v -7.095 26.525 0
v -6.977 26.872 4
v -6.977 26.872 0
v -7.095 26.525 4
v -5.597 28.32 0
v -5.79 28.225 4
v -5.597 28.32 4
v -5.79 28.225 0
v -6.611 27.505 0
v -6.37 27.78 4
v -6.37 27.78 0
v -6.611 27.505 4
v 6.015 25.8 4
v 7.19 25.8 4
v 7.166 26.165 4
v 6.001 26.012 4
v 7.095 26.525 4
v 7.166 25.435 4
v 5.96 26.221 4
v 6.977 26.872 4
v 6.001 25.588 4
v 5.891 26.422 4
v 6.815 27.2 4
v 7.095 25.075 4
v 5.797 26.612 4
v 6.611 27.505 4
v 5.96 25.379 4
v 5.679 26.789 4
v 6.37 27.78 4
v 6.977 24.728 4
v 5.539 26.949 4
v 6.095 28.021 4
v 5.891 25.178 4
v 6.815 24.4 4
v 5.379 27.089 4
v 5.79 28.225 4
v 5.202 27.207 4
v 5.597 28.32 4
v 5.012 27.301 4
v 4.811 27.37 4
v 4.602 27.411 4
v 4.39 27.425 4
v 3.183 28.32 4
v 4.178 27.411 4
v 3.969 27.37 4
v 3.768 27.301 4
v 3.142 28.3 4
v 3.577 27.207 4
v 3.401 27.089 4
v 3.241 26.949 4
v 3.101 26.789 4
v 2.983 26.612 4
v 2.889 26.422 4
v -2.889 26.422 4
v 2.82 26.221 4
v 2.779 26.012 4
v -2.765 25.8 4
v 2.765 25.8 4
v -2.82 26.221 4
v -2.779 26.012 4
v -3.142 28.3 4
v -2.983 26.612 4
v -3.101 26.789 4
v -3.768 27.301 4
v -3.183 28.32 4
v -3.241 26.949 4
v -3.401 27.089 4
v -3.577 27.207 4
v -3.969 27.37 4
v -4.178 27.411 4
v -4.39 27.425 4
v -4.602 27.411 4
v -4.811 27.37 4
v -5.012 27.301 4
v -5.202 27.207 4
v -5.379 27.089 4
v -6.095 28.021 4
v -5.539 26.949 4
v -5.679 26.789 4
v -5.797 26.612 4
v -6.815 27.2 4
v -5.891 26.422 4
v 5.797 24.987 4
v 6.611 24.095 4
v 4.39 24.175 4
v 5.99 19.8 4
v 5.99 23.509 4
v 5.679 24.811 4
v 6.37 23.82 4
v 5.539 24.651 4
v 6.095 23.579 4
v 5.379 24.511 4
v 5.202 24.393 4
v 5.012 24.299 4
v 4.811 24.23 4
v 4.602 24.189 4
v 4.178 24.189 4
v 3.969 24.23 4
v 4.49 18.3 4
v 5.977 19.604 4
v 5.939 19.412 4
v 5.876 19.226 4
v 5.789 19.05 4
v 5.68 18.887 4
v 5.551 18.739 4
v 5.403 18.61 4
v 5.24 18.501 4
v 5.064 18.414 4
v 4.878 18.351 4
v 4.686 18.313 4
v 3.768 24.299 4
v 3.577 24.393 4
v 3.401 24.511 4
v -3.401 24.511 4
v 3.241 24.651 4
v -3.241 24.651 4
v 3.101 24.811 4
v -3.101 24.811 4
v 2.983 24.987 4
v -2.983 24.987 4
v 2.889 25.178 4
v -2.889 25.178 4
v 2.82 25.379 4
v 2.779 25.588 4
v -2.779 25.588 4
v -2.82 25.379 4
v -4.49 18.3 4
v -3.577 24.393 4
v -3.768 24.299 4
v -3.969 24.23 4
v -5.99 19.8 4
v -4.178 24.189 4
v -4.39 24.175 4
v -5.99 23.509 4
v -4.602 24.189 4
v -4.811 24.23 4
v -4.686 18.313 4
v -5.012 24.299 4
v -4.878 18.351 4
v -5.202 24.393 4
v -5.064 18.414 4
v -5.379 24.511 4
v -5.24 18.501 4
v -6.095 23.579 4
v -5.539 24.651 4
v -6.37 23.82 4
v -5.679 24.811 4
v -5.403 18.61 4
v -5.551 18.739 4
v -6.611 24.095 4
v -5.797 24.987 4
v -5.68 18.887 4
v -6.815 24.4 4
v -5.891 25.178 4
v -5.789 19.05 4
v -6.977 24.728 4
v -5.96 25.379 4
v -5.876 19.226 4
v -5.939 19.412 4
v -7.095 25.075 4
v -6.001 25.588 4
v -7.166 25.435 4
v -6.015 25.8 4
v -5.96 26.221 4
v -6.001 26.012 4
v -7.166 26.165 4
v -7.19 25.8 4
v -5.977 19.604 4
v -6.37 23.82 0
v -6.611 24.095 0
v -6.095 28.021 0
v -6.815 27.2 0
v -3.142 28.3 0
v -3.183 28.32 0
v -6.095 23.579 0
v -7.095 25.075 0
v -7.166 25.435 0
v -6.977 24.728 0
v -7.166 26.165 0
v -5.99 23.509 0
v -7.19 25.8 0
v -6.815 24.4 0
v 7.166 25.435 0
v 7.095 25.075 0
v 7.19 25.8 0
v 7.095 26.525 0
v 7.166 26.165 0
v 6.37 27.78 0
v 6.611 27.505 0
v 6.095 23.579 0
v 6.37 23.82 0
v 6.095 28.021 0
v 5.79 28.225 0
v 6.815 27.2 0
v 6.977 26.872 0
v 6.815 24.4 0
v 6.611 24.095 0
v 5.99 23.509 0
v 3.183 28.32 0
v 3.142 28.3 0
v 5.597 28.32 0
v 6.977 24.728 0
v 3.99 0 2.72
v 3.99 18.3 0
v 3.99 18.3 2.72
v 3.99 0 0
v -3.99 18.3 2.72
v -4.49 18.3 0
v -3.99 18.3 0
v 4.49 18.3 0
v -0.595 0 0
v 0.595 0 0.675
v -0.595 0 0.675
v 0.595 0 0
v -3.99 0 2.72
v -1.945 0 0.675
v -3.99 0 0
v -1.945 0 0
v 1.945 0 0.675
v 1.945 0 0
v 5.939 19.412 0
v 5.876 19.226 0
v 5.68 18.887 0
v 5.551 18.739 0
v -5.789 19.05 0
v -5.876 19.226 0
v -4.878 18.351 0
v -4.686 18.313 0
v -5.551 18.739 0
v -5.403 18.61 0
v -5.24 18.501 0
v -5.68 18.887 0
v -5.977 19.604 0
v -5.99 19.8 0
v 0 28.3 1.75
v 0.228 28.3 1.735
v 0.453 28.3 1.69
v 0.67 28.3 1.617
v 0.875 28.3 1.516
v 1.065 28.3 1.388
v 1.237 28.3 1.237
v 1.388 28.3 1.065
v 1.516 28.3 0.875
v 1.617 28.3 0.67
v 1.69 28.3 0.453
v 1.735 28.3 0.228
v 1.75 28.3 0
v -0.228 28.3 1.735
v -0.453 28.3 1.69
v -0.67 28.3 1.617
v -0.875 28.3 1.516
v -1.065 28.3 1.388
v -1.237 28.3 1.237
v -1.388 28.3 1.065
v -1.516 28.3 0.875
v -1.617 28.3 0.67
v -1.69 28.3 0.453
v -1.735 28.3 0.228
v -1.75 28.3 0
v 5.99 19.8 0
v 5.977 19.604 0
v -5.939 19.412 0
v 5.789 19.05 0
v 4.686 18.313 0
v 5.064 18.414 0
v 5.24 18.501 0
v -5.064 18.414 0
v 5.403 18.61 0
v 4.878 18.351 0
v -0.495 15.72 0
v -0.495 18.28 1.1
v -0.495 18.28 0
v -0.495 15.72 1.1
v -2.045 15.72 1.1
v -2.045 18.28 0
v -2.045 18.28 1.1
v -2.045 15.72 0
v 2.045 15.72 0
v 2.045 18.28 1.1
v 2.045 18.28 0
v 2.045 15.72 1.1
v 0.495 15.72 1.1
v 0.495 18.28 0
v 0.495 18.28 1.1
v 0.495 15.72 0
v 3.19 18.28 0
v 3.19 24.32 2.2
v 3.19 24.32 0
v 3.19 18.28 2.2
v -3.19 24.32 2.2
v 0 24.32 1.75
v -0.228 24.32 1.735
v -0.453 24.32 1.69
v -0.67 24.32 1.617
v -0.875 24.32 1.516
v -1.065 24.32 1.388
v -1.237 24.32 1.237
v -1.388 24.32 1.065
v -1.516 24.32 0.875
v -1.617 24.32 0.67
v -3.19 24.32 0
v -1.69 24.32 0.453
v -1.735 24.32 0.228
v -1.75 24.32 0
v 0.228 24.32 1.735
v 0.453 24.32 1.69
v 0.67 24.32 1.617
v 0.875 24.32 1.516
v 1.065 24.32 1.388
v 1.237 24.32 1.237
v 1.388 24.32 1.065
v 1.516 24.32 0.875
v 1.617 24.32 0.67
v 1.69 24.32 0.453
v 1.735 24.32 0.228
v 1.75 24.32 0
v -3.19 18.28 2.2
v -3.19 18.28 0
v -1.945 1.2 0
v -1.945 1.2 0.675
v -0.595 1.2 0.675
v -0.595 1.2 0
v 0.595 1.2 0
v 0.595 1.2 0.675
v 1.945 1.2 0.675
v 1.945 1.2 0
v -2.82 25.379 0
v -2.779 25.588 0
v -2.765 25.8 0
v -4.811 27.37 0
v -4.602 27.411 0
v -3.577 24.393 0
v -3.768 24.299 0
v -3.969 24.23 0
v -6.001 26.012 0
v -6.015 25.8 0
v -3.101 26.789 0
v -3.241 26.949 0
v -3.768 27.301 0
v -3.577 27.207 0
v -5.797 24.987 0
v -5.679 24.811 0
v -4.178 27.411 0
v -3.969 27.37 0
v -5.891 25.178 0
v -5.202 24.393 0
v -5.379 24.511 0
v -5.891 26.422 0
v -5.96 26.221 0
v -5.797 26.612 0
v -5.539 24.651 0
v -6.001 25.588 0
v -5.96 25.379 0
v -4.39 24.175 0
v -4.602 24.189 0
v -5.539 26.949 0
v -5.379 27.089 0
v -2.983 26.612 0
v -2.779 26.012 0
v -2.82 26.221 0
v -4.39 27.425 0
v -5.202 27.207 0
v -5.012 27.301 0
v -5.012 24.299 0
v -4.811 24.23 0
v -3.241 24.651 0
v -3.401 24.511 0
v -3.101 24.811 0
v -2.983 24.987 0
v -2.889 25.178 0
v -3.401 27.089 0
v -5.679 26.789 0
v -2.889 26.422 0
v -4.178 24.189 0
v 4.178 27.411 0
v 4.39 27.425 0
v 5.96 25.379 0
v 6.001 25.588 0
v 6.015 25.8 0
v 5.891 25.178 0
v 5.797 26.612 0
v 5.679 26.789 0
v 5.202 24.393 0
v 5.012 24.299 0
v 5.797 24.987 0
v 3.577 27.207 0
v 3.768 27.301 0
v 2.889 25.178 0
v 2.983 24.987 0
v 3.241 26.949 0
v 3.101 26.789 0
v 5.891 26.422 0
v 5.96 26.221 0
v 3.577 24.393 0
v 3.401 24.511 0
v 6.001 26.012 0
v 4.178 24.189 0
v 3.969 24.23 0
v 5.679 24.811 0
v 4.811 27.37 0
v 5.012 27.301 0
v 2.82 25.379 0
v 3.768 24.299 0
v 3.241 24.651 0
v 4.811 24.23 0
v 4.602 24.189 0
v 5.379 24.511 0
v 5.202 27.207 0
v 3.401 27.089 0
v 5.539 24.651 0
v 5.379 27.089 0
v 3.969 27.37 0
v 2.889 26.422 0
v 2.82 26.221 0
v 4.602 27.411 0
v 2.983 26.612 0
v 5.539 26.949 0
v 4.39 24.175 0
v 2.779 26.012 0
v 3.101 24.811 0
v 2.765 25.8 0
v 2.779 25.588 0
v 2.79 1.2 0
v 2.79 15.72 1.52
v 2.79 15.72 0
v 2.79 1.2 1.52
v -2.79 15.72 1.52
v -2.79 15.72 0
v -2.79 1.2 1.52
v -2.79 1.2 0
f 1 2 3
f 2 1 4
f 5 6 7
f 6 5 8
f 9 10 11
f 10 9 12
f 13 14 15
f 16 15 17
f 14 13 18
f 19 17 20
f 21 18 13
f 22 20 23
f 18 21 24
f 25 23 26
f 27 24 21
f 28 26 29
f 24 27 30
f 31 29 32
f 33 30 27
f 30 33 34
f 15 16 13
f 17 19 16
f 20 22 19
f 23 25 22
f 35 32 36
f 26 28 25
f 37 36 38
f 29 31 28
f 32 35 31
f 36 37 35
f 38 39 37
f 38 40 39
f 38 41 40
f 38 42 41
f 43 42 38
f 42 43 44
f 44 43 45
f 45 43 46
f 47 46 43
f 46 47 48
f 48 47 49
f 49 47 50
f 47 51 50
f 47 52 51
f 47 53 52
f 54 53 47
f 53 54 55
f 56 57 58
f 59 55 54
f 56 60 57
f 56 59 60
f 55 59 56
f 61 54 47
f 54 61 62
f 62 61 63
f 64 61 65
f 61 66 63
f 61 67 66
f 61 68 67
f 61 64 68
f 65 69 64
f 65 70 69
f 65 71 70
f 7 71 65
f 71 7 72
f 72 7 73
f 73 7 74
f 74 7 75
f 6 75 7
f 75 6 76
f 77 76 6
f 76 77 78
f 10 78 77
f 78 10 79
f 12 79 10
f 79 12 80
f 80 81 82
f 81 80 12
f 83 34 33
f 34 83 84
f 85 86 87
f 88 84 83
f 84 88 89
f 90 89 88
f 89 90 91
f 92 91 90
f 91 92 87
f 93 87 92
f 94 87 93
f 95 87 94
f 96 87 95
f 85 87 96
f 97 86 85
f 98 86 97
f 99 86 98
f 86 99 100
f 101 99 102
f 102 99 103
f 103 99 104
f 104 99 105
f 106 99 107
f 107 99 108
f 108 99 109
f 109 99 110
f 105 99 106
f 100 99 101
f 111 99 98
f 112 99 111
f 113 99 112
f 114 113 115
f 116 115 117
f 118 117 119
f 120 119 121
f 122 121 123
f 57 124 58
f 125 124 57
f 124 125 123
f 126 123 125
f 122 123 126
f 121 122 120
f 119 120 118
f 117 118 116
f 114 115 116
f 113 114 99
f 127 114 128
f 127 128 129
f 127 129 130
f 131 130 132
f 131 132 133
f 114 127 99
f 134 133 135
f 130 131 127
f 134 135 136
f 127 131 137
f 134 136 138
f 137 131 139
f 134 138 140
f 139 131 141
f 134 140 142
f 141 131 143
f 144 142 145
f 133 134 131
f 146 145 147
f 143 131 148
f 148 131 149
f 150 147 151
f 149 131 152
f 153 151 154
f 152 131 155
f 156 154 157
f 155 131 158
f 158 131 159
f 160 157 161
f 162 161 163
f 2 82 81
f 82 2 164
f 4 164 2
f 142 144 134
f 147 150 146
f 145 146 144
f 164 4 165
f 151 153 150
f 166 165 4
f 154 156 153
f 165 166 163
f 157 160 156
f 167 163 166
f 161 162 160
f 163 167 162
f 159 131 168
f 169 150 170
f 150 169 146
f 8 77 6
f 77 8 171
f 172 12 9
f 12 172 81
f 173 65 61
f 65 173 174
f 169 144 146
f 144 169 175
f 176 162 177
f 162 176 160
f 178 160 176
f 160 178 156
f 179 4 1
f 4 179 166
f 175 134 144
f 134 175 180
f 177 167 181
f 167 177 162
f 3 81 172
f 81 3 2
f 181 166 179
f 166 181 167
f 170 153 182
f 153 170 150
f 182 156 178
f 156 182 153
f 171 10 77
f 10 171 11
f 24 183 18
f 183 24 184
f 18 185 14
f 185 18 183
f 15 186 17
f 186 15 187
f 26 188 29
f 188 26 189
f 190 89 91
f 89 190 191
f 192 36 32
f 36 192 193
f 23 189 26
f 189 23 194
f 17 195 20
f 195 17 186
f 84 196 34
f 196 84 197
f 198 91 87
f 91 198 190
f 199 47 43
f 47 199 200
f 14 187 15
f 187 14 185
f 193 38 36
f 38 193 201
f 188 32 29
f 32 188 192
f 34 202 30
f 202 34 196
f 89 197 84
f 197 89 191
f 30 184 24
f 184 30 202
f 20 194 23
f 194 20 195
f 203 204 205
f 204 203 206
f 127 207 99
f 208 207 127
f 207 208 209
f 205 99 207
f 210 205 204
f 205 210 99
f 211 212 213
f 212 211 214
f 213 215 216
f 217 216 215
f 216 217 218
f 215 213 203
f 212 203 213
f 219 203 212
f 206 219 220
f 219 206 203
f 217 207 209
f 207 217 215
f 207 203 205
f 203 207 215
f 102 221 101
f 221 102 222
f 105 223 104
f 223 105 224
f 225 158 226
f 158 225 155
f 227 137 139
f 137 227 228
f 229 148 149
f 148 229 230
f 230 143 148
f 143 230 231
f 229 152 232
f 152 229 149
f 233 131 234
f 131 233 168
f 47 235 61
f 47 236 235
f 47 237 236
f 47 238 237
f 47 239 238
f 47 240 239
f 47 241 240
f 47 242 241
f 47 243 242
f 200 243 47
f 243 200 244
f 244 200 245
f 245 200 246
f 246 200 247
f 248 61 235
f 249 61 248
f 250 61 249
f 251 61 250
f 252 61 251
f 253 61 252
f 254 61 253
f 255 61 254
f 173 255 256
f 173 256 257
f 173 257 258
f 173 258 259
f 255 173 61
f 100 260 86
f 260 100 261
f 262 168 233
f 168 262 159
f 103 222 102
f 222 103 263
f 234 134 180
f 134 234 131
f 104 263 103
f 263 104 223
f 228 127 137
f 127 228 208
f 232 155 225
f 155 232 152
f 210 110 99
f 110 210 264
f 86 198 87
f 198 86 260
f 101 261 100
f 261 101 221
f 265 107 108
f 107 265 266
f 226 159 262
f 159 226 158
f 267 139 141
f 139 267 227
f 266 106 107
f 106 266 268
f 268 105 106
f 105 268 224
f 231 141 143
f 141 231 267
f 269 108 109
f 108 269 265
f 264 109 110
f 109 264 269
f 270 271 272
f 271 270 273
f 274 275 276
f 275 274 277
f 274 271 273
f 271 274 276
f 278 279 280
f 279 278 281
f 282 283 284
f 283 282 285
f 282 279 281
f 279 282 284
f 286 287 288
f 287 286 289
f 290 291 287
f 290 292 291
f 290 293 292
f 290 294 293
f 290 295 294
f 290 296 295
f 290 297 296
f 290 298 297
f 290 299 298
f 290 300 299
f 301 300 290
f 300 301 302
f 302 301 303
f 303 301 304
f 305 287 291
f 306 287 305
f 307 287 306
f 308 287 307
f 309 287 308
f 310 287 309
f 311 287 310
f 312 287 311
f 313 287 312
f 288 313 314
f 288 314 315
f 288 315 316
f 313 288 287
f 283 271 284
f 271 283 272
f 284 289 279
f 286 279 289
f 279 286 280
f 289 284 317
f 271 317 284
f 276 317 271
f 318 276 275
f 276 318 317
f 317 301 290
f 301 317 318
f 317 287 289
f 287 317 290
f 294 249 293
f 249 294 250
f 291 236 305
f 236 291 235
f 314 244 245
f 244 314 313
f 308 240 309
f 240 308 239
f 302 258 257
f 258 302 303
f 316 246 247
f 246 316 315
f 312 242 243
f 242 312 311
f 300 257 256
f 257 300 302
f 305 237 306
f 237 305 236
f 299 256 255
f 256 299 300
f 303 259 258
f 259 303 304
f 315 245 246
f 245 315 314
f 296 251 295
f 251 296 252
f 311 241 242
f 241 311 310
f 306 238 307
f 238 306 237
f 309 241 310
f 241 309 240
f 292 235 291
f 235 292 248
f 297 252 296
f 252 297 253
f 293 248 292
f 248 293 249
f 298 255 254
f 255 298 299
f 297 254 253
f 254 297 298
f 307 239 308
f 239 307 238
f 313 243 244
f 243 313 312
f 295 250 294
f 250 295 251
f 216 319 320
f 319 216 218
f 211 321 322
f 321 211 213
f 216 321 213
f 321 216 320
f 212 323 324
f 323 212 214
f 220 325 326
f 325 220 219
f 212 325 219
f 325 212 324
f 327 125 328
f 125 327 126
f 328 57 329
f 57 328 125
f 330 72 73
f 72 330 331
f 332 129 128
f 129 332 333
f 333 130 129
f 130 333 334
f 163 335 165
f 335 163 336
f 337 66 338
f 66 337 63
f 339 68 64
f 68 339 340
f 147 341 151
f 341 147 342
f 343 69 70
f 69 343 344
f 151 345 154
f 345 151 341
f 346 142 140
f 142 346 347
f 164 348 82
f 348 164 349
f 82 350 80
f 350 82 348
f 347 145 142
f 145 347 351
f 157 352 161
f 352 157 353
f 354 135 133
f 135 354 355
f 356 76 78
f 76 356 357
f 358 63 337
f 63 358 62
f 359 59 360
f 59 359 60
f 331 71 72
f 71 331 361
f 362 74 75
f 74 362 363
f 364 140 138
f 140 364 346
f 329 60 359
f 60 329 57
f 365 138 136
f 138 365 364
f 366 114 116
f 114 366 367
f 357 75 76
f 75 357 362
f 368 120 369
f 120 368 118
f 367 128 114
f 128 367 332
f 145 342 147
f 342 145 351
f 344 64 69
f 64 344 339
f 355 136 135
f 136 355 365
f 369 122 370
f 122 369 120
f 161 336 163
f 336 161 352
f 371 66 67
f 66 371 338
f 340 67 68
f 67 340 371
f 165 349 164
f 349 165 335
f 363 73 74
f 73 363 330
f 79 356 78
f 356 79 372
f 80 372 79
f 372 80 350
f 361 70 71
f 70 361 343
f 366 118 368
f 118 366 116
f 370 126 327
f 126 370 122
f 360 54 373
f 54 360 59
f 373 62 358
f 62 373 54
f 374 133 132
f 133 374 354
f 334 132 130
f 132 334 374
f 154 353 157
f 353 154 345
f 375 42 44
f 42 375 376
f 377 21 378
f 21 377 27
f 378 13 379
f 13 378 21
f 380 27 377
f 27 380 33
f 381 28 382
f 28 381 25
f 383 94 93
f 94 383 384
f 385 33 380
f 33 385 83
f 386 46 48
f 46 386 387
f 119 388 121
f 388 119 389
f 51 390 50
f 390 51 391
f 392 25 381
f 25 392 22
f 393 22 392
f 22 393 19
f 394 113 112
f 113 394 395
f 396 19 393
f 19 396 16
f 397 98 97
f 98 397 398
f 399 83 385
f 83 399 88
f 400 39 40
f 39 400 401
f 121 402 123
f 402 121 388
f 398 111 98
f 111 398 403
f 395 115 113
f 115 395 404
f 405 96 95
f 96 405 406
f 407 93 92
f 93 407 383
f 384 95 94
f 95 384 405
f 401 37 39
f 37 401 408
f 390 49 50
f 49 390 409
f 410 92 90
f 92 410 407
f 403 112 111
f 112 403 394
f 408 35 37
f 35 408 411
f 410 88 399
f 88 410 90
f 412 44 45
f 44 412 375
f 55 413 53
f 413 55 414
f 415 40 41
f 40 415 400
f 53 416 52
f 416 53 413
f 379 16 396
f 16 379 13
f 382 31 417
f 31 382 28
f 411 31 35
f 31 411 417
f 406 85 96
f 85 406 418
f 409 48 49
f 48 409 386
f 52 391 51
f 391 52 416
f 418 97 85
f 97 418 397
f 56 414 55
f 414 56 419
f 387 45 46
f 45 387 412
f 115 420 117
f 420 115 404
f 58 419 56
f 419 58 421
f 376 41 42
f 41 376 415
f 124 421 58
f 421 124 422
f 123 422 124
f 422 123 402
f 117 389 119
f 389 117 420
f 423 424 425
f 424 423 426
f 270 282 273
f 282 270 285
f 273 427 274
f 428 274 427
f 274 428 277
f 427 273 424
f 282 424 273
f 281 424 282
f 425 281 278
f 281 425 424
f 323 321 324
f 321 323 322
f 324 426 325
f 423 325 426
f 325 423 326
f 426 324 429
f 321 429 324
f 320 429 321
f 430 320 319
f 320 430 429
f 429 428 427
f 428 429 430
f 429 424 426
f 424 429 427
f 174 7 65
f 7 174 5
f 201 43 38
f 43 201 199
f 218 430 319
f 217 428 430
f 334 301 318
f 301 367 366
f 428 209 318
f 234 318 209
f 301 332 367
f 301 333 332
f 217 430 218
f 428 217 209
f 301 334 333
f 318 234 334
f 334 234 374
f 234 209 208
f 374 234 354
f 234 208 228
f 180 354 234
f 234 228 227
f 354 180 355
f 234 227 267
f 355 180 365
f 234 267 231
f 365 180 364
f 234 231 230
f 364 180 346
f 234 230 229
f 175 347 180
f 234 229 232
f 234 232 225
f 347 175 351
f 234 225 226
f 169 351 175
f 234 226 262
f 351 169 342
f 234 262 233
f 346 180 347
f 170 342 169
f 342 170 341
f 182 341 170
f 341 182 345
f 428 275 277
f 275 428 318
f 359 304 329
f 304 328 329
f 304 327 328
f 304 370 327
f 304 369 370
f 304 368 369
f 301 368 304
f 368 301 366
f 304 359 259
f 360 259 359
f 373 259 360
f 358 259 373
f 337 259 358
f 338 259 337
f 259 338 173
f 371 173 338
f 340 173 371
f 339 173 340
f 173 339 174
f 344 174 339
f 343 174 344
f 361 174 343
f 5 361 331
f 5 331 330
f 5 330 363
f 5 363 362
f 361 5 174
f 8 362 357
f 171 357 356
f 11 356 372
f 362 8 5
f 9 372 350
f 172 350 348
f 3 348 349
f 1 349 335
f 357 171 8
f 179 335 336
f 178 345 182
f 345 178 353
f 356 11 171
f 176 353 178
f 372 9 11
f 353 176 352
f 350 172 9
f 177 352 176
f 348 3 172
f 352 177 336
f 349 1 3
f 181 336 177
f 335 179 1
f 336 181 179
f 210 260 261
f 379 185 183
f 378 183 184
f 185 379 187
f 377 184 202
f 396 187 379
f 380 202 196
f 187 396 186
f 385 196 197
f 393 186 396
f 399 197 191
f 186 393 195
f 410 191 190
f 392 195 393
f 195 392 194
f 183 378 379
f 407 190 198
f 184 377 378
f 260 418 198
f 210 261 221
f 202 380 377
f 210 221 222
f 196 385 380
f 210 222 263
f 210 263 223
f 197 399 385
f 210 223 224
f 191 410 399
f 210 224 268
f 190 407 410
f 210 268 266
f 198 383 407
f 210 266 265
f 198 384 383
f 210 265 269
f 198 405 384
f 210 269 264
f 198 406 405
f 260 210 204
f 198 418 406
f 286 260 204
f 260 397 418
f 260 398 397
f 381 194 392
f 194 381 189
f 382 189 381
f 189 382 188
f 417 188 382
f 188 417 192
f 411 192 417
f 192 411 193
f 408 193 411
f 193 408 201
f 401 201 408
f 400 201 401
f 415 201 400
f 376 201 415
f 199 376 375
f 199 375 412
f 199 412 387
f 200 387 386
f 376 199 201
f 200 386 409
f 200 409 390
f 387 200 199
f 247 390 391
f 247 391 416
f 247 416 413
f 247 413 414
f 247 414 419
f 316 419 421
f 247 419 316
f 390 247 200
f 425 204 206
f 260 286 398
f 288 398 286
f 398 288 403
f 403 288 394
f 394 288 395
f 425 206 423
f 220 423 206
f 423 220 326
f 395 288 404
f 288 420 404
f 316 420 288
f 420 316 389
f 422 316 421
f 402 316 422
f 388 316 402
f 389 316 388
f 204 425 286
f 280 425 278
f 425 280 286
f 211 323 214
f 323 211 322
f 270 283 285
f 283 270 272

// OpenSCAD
// file: perfboard-male-end-v1.scad
// Perfboard-side 1x2 / 1x4 holder for individual MALE Dupont jumper ends.
// Matching keyed collar surrounds a soldered FEMALE header on the perfboard.
// Fit prototype only: verify the real jumper housings and pin engagement.
// All dimensions in millimetres.

$fn = 48;

contacts = 2; // [2,4]
part = "plug_lower"; // [plug_lower,plug_upper,board_collar,assembly,exploded]

pitch = 2.54;
pin_aperture = 1.35;
front_lip = 1.20;

// Generic 1P Dupont housing dimensions, NOT verified for the purchased wires.
single_x = 2.54;
single_y = 2.54;
single_z = 14.00;
pack_fit_x = 0.50;
pack_fit_y = 0.50;
pack_fit_z = 0.50;

body_x = contacts*single_x + pack_fit_x;
body_y = single_y + pack_fit_y;
nose_x = body_x + 2.40;
nose_y = body_y + 2.40;
rear_stop = 2.60;
nose_z = front_lip + single_z + pack_fit_z + rear_stop;

rear_x = nose_x + 4.00;
rear_y = 8.00;
rear_z = 10.00;
total_z = nose_z + rear_z;
rear_corner_r = 1.50;

wire_slot_x = 1.55;
wire_slot_y = 2.20;
rear_chamber_x = body_x + 0.80;
rear_chamber_y = 4.40;
rear_chamber_z = 6.00;
cable_exit_d = contacts == 2 ? 3.50 : 5.20;

tie_groove_depth = 0.55;
tie_groove_width = 2.40;
tie_z = nose_z + 4.00;

// Optional two-M3 clamp revision. The screws pass through the rear body,
// outside the cable exit, so both halves remain joined when unplugged.
clamp_screws = false;
clamp_hole_d = 3.25;
clamp_boss_r = 2.80;
clamp_x = rear_x/2-1.60;
clamp_z = nose_z+7.50;

key_width = 1.40;
key_projection = 1.10;
key_x = contacts == 2 ? 0 : pitch;
key_side = contacts == 2 ? 1 : -1;
collar_clearance = 0.55;
collar_wall = 2.00;
collar_h = 7.50;
pin1_mark_d = 1.20;
pin1_mark_depth = 0.50;

epsilon = 0.02;

assert(contacts == 2 || contacts == 4);
assert(pin_aperture < pitch);

function contact_x(i) = (i-(contacts-1)/2)*pitch;

module pin_pattern(h=front_lip) {
    for (i = [0:contacts-1])
        translate([contact_x(i), 0, -epsilon])
            linear_extrude(height=h+2*epsilon)
                square([pin_aperture, pin_aperture], center=true);
}

module key_rib() {
    translate([key_x-key_width/2,
               key_side > 0 ? nose_y/2 : -nose_y/2-key_projection,
               0])
        cube([key_width, key_projection, nose_z]);
}

module rounded_rear() {
    hull()
        for (x = [-rear_x/2+rear_corner_r,
                   rear_x/2-rear_corner_r],
             z = [nose_z+rear_corner_r,
                  total_z-rear_corner_r])
            translate([x, 0, z])
                rotate([-90, 0, 0])
                    cylinder(r=rear_corner_r, h=rear_y, center=true);
}

module outer_plug() {
    union() {
        translate([-nose_x/2, -nose_y/2, 0])
            cube([nose_x, nose_y, nose_z]);
        key_rib();
        rounded_rear();
        if (clamp_screws)
            for (x=[-clamp_x,clamp_x])
                translate([x,0,clamp_z])
                    rotate([-90,0,0])
                        cylinder(r=clamp_boss_r,h=rear_y,center=true);
    }
}

module clamp_holes() {
    for (x=[-clamp_x,clamp_x])
        translate([x,-rear_y/2-epsilon,clamp_z])
            rotate([-90,0,0])
                cylinder(d=clamp_hole_d,h=rear_y+2*epsilon);
}

module body_pocket() {
    translate([-body_x/2, -body_y/2, front_lip])
        cube([body_x, body_y,
              single_z+pack_fit_z+epsilon]);
}

module wire_comb() {
    // Both half-channels open at the y=0 split so a preterminated cable can
    // be laid in place without threading its other end through a small hole.
    for (i = [0:contacts-1])
        translate([contact_x(i)-wire_slot_x/2, -wire_slot_y/2,
                   front_lip+single_z+pack_fit_z-epsilon])
            cube([wire_slot_x, wire_slot_y,
                  rear_stop+2*epsilon]);
}

module rear_cable_space() {
    translate([-rear_chamber_x/2, -rear_chamber_y/2,
               nose_z-epsilon])
        cube([rear_chamber_x, rear_chamber_y,
              rear_chamber_z+2*epsilon]);
    translate([0, 0, nose_z+rear_chamber_z-epsilon])
        cylinder(d=cable_exit_d,
                 h=rear_z-rear_chamber_z+2*epsilon);
}

module tie_groove() {
    // Shallow external groove for one small cable tie across both halves.
    difference() {
        translate([-rear_x, -rear_y, tie_z])
            cube([2*rear_x, 2*rear_y, tie_groove_width]);
        translate([-rear_x/2+tie_groove_depth,
                   -rear_y/2+tie_groove_depth,
                   tie_z-epsilon])
            cube([rear_x-2*tie_groove_depth,
                  rear_y-2*tie_groove_depth,
                  tie_groove_width+2*epsilon]);
    }
}

module pin1_mark() {
    // Recessed dot over x-negative contact 1, on the y-positive half.
    translate([contact_x(0), nose_y/2+epsilon, nose_z/2])
        rotate([90, 0, 0])
            cylinder(d=pin1_mark_d, h=pin1_mark_depth+2*epsilon);
}

module whole_plug() {
    difference() {
        outer_plug();
        body_pocket();
        wire_comb();
        rear_cable_space();
        pin_pattern();
        if (clamp_screws) clamp_holes();
        else tie_groove();
        pin1_mark();
    }
}

module lower_half() {
    intersection() {
        whole_plug();
        translate([-rear_x, -rear_y, -epsilon])
            cube([2*rear_x, rear_y, total_z+2*epsilon]);
    }
}

module upper_half() {
    intersection() {
        whole_plug();
        translate([-rear_x, 0, -epsilon])
            cube([2*rear_x, rear_y, total_z+2*epsilon]);
    }
}

module keyed_opening(h) {
    inner_x = nose_x+collar_clearance;
    inner_y = nose_y+collar_clearance;
    translate([-inner_x/2, -inner_y/2, -epsilon])
        cube([inner_x, inner_y, h+2*epsilon]);
    slot_x = key_width+collar_clearance;
    translate([key_x-slot_x/2,
               key_side > 0 ? nose_y/2 :
                              -nose_y/2-key_projection-collar_clearance/2,
               -epsilon])
        cube([slot_x, key_projection+collar_clearance/2,
              h+2*epsilon]);
}

module board_collar() {
    outer_x = nose_x+collar_clearance+2*collar_wall;
    outer_y = nose_y+collar_clearance+2*collar_wall;
    difference() {
        translate([-outer_x/2, -outer_y/2, 0])
            cube([outer_x, outer_y, collar_h]);
        keyed_opening(collar_h);
    }
}

module mockup_ends() {
    for (i = [0:contacts-1])
        color([0.12, 0.12, 0.12, 0.5])
            translate([contact_x(i)-single_x/2,
                       -single_y/2, front_lip])
                cube([single_x, single_y, single_z]);
}

if (part == "plug_lower") rotate([-90, 0, 0]) lower_half();
else if (part == "plug_upper") rotate([90, 0, 0]) upper_half();
else if (part == "board_collar") board_collar();
else if (part == "assembly") {
    lower_half();
    color([0.40, 0.75, 0.85, 0.45]) upper_half();
    mockup_ends();
} else if (part == "exploded") {
    color([0.40, 0.75, 0.85]) translate([0, 4.0, 12]) upper_half();
    color([0.45, 0.70, 0.45]) translate([0, -4.0, 12]) lower_half();
    color([0.95, 0.55, 0.22]) board_collar();
    mockup_ends();
} else assert(false, str("Unknown part: ", part));
// main file
// M3-clamped version of the male jumper-end holder. The keyed nose and
// individual 2.54 mm contact pockets remain identical to v1.
// Export contacts=2 or 4 and part=plug_lower or plug_upper.

include <perfboard-male-end-v1.scad>

clamp_screws = true;
